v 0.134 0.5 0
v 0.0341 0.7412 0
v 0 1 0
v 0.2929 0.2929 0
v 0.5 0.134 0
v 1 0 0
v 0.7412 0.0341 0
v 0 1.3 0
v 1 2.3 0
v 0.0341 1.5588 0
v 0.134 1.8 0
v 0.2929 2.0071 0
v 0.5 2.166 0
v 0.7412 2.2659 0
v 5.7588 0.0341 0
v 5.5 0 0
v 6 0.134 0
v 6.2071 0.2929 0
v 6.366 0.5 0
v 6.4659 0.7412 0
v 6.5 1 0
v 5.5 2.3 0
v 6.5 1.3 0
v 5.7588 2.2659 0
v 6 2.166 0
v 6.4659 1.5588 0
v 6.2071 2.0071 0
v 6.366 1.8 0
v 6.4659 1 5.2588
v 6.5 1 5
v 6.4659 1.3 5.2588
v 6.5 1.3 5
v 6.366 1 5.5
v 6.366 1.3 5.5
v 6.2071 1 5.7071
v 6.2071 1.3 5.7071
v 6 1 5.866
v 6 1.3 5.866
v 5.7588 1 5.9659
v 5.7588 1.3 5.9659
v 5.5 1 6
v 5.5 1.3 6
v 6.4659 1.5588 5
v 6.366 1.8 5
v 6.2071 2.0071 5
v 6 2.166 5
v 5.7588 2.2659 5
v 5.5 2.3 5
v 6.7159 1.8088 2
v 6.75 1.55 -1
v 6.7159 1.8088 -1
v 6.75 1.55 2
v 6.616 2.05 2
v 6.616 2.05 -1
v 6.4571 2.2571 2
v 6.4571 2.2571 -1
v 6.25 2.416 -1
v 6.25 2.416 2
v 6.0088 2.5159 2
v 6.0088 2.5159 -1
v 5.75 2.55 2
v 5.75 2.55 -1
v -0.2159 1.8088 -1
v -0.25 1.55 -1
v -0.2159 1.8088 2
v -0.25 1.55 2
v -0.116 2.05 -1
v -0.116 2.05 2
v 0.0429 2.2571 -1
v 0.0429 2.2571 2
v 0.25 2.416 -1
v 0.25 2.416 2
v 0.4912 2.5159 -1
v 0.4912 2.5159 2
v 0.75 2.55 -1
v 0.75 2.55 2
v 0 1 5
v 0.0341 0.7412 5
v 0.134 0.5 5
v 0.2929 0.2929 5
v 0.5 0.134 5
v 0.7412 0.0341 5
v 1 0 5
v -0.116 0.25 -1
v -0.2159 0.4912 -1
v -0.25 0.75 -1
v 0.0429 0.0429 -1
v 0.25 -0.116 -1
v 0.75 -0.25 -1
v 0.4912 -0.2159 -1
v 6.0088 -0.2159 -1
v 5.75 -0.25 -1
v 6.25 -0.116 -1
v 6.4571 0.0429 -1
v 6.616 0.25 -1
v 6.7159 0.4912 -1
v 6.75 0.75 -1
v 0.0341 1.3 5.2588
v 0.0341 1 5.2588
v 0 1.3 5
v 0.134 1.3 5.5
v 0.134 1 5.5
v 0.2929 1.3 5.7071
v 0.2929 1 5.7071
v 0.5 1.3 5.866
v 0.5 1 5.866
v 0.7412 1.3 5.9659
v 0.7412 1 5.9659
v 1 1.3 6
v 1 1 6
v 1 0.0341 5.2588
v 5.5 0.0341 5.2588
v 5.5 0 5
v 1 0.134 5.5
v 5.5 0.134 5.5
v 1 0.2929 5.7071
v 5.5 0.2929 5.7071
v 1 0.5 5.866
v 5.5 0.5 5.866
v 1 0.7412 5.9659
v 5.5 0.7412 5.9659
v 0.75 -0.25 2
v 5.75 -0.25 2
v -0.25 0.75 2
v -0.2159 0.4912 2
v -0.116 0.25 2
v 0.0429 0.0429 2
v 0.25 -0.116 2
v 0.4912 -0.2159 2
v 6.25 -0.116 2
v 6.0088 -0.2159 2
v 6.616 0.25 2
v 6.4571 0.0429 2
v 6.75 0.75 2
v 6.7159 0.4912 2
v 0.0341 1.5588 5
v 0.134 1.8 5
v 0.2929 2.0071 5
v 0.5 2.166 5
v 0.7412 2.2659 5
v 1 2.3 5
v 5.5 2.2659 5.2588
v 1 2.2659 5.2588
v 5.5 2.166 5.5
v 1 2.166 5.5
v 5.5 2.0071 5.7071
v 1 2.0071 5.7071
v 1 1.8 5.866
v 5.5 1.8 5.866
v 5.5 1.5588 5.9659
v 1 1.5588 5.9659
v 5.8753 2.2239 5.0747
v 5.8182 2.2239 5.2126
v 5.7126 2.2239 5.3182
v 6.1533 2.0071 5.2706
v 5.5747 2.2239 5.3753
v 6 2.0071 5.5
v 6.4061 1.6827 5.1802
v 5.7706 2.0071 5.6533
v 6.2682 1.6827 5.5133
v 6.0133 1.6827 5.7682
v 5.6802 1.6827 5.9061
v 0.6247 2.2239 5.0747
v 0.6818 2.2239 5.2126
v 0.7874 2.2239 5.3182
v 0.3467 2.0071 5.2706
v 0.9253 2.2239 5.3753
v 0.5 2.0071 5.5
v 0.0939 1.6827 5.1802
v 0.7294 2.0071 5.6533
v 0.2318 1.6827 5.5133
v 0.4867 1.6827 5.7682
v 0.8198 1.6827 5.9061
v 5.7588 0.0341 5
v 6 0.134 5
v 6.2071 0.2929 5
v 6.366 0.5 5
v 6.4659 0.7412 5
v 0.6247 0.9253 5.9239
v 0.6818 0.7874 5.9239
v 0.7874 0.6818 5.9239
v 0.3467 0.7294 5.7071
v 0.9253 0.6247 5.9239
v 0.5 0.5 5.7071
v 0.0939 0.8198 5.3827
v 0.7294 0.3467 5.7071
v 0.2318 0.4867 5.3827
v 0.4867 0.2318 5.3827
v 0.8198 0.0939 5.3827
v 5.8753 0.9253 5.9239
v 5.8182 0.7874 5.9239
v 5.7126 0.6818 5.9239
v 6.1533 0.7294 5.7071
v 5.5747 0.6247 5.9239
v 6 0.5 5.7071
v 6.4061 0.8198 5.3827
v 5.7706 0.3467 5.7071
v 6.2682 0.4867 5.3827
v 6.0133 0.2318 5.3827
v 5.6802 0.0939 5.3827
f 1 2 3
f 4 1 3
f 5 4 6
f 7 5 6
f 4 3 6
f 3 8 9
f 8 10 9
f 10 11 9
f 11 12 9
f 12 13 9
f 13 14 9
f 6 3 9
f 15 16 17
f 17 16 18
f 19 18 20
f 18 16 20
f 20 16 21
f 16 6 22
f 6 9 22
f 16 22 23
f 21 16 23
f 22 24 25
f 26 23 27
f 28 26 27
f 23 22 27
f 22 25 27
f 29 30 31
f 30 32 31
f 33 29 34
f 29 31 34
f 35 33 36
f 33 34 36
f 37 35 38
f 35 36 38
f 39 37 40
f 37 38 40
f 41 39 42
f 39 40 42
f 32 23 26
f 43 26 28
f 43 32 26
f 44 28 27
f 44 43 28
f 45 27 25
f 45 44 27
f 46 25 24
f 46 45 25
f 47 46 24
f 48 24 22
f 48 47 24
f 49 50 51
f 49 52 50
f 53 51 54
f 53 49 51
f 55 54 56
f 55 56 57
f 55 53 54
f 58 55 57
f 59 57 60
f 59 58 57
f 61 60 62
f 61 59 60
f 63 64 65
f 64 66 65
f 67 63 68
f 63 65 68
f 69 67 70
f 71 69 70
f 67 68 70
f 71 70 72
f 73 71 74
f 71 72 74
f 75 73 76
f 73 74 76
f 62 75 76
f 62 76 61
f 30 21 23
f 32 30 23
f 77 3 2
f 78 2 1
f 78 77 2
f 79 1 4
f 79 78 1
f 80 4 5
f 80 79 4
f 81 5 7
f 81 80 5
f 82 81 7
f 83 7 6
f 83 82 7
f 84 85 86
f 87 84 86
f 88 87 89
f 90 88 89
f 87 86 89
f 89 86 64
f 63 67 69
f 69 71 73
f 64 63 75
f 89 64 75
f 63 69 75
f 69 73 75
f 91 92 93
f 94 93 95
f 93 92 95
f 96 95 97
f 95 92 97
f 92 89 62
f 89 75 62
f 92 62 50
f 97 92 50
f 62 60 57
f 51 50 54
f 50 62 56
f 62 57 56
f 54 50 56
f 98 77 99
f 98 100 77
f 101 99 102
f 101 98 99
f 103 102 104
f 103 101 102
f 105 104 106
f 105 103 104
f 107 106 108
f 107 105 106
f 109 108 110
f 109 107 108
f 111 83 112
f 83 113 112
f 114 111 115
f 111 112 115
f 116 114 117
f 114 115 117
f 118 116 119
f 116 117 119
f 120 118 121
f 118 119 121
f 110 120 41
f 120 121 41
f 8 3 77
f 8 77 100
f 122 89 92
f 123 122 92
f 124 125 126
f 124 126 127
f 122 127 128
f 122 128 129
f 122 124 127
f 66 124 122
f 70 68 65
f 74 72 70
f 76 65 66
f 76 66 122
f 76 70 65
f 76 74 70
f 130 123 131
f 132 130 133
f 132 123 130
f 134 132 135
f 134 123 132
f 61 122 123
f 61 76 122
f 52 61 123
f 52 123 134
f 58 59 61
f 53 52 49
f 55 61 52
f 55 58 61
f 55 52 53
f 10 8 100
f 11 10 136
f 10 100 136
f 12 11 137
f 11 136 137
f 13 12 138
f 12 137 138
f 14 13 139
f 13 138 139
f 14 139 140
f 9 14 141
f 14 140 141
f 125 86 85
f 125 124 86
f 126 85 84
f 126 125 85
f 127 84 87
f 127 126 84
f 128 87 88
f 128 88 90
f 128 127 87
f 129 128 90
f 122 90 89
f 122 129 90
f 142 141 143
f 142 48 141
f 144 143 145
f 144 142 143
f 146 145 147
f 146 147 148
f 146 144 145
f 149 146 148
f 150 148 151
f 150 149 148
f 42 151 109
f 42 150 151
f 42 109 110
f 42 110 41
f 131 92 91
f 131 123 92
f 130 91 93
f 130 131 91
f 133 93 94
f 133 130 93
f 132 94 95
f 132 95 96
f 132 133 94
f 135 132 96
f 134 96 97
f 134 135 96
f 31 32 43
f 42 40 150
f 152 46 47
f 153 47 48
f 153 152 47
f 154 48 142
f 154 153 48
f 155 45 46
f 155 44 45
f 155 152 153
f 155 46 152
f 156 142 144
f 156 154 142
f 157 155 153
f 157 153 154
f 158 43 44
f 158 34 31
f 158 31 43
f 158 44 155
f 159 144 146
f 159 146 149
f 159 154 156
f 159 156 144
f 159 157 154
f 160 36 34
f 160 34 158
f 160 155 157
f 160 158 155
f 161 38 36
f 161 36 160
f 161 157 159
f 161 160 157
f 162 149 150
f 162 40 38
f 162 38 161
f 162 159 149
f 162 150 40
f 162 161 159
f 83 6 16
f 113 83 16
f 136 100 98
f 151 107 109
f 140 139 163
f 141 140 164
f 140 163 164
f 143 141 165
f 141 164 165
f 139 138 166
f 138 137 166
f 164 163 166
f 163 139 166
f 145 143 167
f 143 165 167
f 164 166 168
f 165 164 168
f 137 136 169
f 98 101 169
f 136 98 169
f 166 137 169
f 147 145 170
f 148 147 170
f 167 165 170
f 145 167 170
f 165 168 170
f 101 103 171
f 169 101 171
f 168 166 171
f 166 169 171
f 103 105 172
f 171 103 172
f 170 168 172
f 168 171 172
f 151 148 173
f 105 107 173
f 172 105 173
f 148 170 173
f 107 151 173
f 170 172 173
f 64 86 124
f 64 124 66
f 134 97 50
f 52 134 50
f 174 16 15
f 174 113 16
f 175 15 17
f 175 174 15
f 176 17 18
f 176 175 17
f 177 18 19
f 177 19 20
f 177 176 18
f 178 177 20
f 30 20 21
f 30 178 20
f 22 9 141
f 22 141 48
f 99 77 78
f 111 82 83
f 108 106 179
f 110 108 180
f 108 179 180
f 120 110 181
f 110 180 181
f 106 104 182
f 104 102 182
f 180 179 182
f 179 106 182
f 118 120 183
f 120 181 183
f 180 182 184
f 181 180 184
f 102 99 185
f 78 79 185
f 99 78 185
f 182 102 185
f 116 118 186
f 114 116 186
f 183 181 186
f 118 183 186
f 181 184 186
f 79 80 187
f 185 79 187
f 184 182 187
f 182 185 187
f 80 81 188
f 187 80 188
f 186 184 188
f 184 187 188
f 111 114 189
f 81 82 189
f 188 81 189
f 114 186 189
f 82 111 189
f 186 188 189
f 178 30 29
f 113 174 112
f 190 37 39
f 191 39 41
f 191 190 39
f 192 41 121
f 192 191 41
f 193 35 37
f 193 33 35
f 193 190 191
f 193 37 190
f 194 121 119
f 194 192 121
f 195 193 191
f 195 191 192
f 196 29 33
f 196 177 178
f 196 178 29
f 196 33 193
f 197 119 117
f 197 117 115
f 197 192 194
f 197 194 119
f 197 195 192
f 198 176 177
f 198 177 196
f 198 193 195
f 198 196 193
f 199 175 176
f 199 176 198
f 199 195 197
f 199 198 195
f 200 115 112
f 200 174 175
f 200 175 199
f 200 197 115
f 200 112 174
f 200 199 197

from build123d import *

# Parameters (mm, degrees)
BOX_W        = 6.5
BOX_H        = 2.3
BOX_DEPTH    = 6
FILLET_R     = 1
BOX001_W     = 7
BOX001_H     = 2.8
BOX001_DEPTH = 3
FILLET001_R  = 1


with BuildPart() as fillet_body:
    # Box → Box (new body)
    with BuildSketch(Plane.XY):
        with Locations((3.25, 1.15)):
            Rectangle(BOX_W, BOX_H)
    extrude(amount=BOX_DEPTH)

    # Fillet
    fillet_edges = [fillet_body.edges().sort_by_distance(p)[0] for p in [
        (0, 0, 3),
        (0, 1.15, 6),
        (0, 2.3, 3),
        (6.5, 0, 3),
        (6.5, 1.15, 6),
        (6.5, 2.3, 3),
        (3.25, 0, 6),
        (3.25, 2.3, 6),
    ]]
    fillet(fillet_edges, radius=FILLET_R)


with BuildPart() as fillet001:
    # Box001 → Box001 (new body)
    with BuildSketch(Plane(origin=(-0.25, -0.25, -1), x_dir=(1, 0, 0), z_dir=(0, 0, 1))):
        with Locations((3.5, 1.4)):
            Rectangle(BOX001_W, BOX001_H)
    extrude(amount=BOX001_DEPTH)

    # Fillet001
    fillet001_edges = [fillet001.edges().sort_by_distance(p)[0] for p in [
        (-0.25, -0.25, 0.5),
        (-0.25, 2.55, 0.5),
        (6.75, -0.25, 0.5),
        (6.75, 2.55, 0.5),
    ]]
    fillet(fillet001_edges, radius=FILLET001_R)


solid = Compound([fillet_body.part, fillet001.part])
